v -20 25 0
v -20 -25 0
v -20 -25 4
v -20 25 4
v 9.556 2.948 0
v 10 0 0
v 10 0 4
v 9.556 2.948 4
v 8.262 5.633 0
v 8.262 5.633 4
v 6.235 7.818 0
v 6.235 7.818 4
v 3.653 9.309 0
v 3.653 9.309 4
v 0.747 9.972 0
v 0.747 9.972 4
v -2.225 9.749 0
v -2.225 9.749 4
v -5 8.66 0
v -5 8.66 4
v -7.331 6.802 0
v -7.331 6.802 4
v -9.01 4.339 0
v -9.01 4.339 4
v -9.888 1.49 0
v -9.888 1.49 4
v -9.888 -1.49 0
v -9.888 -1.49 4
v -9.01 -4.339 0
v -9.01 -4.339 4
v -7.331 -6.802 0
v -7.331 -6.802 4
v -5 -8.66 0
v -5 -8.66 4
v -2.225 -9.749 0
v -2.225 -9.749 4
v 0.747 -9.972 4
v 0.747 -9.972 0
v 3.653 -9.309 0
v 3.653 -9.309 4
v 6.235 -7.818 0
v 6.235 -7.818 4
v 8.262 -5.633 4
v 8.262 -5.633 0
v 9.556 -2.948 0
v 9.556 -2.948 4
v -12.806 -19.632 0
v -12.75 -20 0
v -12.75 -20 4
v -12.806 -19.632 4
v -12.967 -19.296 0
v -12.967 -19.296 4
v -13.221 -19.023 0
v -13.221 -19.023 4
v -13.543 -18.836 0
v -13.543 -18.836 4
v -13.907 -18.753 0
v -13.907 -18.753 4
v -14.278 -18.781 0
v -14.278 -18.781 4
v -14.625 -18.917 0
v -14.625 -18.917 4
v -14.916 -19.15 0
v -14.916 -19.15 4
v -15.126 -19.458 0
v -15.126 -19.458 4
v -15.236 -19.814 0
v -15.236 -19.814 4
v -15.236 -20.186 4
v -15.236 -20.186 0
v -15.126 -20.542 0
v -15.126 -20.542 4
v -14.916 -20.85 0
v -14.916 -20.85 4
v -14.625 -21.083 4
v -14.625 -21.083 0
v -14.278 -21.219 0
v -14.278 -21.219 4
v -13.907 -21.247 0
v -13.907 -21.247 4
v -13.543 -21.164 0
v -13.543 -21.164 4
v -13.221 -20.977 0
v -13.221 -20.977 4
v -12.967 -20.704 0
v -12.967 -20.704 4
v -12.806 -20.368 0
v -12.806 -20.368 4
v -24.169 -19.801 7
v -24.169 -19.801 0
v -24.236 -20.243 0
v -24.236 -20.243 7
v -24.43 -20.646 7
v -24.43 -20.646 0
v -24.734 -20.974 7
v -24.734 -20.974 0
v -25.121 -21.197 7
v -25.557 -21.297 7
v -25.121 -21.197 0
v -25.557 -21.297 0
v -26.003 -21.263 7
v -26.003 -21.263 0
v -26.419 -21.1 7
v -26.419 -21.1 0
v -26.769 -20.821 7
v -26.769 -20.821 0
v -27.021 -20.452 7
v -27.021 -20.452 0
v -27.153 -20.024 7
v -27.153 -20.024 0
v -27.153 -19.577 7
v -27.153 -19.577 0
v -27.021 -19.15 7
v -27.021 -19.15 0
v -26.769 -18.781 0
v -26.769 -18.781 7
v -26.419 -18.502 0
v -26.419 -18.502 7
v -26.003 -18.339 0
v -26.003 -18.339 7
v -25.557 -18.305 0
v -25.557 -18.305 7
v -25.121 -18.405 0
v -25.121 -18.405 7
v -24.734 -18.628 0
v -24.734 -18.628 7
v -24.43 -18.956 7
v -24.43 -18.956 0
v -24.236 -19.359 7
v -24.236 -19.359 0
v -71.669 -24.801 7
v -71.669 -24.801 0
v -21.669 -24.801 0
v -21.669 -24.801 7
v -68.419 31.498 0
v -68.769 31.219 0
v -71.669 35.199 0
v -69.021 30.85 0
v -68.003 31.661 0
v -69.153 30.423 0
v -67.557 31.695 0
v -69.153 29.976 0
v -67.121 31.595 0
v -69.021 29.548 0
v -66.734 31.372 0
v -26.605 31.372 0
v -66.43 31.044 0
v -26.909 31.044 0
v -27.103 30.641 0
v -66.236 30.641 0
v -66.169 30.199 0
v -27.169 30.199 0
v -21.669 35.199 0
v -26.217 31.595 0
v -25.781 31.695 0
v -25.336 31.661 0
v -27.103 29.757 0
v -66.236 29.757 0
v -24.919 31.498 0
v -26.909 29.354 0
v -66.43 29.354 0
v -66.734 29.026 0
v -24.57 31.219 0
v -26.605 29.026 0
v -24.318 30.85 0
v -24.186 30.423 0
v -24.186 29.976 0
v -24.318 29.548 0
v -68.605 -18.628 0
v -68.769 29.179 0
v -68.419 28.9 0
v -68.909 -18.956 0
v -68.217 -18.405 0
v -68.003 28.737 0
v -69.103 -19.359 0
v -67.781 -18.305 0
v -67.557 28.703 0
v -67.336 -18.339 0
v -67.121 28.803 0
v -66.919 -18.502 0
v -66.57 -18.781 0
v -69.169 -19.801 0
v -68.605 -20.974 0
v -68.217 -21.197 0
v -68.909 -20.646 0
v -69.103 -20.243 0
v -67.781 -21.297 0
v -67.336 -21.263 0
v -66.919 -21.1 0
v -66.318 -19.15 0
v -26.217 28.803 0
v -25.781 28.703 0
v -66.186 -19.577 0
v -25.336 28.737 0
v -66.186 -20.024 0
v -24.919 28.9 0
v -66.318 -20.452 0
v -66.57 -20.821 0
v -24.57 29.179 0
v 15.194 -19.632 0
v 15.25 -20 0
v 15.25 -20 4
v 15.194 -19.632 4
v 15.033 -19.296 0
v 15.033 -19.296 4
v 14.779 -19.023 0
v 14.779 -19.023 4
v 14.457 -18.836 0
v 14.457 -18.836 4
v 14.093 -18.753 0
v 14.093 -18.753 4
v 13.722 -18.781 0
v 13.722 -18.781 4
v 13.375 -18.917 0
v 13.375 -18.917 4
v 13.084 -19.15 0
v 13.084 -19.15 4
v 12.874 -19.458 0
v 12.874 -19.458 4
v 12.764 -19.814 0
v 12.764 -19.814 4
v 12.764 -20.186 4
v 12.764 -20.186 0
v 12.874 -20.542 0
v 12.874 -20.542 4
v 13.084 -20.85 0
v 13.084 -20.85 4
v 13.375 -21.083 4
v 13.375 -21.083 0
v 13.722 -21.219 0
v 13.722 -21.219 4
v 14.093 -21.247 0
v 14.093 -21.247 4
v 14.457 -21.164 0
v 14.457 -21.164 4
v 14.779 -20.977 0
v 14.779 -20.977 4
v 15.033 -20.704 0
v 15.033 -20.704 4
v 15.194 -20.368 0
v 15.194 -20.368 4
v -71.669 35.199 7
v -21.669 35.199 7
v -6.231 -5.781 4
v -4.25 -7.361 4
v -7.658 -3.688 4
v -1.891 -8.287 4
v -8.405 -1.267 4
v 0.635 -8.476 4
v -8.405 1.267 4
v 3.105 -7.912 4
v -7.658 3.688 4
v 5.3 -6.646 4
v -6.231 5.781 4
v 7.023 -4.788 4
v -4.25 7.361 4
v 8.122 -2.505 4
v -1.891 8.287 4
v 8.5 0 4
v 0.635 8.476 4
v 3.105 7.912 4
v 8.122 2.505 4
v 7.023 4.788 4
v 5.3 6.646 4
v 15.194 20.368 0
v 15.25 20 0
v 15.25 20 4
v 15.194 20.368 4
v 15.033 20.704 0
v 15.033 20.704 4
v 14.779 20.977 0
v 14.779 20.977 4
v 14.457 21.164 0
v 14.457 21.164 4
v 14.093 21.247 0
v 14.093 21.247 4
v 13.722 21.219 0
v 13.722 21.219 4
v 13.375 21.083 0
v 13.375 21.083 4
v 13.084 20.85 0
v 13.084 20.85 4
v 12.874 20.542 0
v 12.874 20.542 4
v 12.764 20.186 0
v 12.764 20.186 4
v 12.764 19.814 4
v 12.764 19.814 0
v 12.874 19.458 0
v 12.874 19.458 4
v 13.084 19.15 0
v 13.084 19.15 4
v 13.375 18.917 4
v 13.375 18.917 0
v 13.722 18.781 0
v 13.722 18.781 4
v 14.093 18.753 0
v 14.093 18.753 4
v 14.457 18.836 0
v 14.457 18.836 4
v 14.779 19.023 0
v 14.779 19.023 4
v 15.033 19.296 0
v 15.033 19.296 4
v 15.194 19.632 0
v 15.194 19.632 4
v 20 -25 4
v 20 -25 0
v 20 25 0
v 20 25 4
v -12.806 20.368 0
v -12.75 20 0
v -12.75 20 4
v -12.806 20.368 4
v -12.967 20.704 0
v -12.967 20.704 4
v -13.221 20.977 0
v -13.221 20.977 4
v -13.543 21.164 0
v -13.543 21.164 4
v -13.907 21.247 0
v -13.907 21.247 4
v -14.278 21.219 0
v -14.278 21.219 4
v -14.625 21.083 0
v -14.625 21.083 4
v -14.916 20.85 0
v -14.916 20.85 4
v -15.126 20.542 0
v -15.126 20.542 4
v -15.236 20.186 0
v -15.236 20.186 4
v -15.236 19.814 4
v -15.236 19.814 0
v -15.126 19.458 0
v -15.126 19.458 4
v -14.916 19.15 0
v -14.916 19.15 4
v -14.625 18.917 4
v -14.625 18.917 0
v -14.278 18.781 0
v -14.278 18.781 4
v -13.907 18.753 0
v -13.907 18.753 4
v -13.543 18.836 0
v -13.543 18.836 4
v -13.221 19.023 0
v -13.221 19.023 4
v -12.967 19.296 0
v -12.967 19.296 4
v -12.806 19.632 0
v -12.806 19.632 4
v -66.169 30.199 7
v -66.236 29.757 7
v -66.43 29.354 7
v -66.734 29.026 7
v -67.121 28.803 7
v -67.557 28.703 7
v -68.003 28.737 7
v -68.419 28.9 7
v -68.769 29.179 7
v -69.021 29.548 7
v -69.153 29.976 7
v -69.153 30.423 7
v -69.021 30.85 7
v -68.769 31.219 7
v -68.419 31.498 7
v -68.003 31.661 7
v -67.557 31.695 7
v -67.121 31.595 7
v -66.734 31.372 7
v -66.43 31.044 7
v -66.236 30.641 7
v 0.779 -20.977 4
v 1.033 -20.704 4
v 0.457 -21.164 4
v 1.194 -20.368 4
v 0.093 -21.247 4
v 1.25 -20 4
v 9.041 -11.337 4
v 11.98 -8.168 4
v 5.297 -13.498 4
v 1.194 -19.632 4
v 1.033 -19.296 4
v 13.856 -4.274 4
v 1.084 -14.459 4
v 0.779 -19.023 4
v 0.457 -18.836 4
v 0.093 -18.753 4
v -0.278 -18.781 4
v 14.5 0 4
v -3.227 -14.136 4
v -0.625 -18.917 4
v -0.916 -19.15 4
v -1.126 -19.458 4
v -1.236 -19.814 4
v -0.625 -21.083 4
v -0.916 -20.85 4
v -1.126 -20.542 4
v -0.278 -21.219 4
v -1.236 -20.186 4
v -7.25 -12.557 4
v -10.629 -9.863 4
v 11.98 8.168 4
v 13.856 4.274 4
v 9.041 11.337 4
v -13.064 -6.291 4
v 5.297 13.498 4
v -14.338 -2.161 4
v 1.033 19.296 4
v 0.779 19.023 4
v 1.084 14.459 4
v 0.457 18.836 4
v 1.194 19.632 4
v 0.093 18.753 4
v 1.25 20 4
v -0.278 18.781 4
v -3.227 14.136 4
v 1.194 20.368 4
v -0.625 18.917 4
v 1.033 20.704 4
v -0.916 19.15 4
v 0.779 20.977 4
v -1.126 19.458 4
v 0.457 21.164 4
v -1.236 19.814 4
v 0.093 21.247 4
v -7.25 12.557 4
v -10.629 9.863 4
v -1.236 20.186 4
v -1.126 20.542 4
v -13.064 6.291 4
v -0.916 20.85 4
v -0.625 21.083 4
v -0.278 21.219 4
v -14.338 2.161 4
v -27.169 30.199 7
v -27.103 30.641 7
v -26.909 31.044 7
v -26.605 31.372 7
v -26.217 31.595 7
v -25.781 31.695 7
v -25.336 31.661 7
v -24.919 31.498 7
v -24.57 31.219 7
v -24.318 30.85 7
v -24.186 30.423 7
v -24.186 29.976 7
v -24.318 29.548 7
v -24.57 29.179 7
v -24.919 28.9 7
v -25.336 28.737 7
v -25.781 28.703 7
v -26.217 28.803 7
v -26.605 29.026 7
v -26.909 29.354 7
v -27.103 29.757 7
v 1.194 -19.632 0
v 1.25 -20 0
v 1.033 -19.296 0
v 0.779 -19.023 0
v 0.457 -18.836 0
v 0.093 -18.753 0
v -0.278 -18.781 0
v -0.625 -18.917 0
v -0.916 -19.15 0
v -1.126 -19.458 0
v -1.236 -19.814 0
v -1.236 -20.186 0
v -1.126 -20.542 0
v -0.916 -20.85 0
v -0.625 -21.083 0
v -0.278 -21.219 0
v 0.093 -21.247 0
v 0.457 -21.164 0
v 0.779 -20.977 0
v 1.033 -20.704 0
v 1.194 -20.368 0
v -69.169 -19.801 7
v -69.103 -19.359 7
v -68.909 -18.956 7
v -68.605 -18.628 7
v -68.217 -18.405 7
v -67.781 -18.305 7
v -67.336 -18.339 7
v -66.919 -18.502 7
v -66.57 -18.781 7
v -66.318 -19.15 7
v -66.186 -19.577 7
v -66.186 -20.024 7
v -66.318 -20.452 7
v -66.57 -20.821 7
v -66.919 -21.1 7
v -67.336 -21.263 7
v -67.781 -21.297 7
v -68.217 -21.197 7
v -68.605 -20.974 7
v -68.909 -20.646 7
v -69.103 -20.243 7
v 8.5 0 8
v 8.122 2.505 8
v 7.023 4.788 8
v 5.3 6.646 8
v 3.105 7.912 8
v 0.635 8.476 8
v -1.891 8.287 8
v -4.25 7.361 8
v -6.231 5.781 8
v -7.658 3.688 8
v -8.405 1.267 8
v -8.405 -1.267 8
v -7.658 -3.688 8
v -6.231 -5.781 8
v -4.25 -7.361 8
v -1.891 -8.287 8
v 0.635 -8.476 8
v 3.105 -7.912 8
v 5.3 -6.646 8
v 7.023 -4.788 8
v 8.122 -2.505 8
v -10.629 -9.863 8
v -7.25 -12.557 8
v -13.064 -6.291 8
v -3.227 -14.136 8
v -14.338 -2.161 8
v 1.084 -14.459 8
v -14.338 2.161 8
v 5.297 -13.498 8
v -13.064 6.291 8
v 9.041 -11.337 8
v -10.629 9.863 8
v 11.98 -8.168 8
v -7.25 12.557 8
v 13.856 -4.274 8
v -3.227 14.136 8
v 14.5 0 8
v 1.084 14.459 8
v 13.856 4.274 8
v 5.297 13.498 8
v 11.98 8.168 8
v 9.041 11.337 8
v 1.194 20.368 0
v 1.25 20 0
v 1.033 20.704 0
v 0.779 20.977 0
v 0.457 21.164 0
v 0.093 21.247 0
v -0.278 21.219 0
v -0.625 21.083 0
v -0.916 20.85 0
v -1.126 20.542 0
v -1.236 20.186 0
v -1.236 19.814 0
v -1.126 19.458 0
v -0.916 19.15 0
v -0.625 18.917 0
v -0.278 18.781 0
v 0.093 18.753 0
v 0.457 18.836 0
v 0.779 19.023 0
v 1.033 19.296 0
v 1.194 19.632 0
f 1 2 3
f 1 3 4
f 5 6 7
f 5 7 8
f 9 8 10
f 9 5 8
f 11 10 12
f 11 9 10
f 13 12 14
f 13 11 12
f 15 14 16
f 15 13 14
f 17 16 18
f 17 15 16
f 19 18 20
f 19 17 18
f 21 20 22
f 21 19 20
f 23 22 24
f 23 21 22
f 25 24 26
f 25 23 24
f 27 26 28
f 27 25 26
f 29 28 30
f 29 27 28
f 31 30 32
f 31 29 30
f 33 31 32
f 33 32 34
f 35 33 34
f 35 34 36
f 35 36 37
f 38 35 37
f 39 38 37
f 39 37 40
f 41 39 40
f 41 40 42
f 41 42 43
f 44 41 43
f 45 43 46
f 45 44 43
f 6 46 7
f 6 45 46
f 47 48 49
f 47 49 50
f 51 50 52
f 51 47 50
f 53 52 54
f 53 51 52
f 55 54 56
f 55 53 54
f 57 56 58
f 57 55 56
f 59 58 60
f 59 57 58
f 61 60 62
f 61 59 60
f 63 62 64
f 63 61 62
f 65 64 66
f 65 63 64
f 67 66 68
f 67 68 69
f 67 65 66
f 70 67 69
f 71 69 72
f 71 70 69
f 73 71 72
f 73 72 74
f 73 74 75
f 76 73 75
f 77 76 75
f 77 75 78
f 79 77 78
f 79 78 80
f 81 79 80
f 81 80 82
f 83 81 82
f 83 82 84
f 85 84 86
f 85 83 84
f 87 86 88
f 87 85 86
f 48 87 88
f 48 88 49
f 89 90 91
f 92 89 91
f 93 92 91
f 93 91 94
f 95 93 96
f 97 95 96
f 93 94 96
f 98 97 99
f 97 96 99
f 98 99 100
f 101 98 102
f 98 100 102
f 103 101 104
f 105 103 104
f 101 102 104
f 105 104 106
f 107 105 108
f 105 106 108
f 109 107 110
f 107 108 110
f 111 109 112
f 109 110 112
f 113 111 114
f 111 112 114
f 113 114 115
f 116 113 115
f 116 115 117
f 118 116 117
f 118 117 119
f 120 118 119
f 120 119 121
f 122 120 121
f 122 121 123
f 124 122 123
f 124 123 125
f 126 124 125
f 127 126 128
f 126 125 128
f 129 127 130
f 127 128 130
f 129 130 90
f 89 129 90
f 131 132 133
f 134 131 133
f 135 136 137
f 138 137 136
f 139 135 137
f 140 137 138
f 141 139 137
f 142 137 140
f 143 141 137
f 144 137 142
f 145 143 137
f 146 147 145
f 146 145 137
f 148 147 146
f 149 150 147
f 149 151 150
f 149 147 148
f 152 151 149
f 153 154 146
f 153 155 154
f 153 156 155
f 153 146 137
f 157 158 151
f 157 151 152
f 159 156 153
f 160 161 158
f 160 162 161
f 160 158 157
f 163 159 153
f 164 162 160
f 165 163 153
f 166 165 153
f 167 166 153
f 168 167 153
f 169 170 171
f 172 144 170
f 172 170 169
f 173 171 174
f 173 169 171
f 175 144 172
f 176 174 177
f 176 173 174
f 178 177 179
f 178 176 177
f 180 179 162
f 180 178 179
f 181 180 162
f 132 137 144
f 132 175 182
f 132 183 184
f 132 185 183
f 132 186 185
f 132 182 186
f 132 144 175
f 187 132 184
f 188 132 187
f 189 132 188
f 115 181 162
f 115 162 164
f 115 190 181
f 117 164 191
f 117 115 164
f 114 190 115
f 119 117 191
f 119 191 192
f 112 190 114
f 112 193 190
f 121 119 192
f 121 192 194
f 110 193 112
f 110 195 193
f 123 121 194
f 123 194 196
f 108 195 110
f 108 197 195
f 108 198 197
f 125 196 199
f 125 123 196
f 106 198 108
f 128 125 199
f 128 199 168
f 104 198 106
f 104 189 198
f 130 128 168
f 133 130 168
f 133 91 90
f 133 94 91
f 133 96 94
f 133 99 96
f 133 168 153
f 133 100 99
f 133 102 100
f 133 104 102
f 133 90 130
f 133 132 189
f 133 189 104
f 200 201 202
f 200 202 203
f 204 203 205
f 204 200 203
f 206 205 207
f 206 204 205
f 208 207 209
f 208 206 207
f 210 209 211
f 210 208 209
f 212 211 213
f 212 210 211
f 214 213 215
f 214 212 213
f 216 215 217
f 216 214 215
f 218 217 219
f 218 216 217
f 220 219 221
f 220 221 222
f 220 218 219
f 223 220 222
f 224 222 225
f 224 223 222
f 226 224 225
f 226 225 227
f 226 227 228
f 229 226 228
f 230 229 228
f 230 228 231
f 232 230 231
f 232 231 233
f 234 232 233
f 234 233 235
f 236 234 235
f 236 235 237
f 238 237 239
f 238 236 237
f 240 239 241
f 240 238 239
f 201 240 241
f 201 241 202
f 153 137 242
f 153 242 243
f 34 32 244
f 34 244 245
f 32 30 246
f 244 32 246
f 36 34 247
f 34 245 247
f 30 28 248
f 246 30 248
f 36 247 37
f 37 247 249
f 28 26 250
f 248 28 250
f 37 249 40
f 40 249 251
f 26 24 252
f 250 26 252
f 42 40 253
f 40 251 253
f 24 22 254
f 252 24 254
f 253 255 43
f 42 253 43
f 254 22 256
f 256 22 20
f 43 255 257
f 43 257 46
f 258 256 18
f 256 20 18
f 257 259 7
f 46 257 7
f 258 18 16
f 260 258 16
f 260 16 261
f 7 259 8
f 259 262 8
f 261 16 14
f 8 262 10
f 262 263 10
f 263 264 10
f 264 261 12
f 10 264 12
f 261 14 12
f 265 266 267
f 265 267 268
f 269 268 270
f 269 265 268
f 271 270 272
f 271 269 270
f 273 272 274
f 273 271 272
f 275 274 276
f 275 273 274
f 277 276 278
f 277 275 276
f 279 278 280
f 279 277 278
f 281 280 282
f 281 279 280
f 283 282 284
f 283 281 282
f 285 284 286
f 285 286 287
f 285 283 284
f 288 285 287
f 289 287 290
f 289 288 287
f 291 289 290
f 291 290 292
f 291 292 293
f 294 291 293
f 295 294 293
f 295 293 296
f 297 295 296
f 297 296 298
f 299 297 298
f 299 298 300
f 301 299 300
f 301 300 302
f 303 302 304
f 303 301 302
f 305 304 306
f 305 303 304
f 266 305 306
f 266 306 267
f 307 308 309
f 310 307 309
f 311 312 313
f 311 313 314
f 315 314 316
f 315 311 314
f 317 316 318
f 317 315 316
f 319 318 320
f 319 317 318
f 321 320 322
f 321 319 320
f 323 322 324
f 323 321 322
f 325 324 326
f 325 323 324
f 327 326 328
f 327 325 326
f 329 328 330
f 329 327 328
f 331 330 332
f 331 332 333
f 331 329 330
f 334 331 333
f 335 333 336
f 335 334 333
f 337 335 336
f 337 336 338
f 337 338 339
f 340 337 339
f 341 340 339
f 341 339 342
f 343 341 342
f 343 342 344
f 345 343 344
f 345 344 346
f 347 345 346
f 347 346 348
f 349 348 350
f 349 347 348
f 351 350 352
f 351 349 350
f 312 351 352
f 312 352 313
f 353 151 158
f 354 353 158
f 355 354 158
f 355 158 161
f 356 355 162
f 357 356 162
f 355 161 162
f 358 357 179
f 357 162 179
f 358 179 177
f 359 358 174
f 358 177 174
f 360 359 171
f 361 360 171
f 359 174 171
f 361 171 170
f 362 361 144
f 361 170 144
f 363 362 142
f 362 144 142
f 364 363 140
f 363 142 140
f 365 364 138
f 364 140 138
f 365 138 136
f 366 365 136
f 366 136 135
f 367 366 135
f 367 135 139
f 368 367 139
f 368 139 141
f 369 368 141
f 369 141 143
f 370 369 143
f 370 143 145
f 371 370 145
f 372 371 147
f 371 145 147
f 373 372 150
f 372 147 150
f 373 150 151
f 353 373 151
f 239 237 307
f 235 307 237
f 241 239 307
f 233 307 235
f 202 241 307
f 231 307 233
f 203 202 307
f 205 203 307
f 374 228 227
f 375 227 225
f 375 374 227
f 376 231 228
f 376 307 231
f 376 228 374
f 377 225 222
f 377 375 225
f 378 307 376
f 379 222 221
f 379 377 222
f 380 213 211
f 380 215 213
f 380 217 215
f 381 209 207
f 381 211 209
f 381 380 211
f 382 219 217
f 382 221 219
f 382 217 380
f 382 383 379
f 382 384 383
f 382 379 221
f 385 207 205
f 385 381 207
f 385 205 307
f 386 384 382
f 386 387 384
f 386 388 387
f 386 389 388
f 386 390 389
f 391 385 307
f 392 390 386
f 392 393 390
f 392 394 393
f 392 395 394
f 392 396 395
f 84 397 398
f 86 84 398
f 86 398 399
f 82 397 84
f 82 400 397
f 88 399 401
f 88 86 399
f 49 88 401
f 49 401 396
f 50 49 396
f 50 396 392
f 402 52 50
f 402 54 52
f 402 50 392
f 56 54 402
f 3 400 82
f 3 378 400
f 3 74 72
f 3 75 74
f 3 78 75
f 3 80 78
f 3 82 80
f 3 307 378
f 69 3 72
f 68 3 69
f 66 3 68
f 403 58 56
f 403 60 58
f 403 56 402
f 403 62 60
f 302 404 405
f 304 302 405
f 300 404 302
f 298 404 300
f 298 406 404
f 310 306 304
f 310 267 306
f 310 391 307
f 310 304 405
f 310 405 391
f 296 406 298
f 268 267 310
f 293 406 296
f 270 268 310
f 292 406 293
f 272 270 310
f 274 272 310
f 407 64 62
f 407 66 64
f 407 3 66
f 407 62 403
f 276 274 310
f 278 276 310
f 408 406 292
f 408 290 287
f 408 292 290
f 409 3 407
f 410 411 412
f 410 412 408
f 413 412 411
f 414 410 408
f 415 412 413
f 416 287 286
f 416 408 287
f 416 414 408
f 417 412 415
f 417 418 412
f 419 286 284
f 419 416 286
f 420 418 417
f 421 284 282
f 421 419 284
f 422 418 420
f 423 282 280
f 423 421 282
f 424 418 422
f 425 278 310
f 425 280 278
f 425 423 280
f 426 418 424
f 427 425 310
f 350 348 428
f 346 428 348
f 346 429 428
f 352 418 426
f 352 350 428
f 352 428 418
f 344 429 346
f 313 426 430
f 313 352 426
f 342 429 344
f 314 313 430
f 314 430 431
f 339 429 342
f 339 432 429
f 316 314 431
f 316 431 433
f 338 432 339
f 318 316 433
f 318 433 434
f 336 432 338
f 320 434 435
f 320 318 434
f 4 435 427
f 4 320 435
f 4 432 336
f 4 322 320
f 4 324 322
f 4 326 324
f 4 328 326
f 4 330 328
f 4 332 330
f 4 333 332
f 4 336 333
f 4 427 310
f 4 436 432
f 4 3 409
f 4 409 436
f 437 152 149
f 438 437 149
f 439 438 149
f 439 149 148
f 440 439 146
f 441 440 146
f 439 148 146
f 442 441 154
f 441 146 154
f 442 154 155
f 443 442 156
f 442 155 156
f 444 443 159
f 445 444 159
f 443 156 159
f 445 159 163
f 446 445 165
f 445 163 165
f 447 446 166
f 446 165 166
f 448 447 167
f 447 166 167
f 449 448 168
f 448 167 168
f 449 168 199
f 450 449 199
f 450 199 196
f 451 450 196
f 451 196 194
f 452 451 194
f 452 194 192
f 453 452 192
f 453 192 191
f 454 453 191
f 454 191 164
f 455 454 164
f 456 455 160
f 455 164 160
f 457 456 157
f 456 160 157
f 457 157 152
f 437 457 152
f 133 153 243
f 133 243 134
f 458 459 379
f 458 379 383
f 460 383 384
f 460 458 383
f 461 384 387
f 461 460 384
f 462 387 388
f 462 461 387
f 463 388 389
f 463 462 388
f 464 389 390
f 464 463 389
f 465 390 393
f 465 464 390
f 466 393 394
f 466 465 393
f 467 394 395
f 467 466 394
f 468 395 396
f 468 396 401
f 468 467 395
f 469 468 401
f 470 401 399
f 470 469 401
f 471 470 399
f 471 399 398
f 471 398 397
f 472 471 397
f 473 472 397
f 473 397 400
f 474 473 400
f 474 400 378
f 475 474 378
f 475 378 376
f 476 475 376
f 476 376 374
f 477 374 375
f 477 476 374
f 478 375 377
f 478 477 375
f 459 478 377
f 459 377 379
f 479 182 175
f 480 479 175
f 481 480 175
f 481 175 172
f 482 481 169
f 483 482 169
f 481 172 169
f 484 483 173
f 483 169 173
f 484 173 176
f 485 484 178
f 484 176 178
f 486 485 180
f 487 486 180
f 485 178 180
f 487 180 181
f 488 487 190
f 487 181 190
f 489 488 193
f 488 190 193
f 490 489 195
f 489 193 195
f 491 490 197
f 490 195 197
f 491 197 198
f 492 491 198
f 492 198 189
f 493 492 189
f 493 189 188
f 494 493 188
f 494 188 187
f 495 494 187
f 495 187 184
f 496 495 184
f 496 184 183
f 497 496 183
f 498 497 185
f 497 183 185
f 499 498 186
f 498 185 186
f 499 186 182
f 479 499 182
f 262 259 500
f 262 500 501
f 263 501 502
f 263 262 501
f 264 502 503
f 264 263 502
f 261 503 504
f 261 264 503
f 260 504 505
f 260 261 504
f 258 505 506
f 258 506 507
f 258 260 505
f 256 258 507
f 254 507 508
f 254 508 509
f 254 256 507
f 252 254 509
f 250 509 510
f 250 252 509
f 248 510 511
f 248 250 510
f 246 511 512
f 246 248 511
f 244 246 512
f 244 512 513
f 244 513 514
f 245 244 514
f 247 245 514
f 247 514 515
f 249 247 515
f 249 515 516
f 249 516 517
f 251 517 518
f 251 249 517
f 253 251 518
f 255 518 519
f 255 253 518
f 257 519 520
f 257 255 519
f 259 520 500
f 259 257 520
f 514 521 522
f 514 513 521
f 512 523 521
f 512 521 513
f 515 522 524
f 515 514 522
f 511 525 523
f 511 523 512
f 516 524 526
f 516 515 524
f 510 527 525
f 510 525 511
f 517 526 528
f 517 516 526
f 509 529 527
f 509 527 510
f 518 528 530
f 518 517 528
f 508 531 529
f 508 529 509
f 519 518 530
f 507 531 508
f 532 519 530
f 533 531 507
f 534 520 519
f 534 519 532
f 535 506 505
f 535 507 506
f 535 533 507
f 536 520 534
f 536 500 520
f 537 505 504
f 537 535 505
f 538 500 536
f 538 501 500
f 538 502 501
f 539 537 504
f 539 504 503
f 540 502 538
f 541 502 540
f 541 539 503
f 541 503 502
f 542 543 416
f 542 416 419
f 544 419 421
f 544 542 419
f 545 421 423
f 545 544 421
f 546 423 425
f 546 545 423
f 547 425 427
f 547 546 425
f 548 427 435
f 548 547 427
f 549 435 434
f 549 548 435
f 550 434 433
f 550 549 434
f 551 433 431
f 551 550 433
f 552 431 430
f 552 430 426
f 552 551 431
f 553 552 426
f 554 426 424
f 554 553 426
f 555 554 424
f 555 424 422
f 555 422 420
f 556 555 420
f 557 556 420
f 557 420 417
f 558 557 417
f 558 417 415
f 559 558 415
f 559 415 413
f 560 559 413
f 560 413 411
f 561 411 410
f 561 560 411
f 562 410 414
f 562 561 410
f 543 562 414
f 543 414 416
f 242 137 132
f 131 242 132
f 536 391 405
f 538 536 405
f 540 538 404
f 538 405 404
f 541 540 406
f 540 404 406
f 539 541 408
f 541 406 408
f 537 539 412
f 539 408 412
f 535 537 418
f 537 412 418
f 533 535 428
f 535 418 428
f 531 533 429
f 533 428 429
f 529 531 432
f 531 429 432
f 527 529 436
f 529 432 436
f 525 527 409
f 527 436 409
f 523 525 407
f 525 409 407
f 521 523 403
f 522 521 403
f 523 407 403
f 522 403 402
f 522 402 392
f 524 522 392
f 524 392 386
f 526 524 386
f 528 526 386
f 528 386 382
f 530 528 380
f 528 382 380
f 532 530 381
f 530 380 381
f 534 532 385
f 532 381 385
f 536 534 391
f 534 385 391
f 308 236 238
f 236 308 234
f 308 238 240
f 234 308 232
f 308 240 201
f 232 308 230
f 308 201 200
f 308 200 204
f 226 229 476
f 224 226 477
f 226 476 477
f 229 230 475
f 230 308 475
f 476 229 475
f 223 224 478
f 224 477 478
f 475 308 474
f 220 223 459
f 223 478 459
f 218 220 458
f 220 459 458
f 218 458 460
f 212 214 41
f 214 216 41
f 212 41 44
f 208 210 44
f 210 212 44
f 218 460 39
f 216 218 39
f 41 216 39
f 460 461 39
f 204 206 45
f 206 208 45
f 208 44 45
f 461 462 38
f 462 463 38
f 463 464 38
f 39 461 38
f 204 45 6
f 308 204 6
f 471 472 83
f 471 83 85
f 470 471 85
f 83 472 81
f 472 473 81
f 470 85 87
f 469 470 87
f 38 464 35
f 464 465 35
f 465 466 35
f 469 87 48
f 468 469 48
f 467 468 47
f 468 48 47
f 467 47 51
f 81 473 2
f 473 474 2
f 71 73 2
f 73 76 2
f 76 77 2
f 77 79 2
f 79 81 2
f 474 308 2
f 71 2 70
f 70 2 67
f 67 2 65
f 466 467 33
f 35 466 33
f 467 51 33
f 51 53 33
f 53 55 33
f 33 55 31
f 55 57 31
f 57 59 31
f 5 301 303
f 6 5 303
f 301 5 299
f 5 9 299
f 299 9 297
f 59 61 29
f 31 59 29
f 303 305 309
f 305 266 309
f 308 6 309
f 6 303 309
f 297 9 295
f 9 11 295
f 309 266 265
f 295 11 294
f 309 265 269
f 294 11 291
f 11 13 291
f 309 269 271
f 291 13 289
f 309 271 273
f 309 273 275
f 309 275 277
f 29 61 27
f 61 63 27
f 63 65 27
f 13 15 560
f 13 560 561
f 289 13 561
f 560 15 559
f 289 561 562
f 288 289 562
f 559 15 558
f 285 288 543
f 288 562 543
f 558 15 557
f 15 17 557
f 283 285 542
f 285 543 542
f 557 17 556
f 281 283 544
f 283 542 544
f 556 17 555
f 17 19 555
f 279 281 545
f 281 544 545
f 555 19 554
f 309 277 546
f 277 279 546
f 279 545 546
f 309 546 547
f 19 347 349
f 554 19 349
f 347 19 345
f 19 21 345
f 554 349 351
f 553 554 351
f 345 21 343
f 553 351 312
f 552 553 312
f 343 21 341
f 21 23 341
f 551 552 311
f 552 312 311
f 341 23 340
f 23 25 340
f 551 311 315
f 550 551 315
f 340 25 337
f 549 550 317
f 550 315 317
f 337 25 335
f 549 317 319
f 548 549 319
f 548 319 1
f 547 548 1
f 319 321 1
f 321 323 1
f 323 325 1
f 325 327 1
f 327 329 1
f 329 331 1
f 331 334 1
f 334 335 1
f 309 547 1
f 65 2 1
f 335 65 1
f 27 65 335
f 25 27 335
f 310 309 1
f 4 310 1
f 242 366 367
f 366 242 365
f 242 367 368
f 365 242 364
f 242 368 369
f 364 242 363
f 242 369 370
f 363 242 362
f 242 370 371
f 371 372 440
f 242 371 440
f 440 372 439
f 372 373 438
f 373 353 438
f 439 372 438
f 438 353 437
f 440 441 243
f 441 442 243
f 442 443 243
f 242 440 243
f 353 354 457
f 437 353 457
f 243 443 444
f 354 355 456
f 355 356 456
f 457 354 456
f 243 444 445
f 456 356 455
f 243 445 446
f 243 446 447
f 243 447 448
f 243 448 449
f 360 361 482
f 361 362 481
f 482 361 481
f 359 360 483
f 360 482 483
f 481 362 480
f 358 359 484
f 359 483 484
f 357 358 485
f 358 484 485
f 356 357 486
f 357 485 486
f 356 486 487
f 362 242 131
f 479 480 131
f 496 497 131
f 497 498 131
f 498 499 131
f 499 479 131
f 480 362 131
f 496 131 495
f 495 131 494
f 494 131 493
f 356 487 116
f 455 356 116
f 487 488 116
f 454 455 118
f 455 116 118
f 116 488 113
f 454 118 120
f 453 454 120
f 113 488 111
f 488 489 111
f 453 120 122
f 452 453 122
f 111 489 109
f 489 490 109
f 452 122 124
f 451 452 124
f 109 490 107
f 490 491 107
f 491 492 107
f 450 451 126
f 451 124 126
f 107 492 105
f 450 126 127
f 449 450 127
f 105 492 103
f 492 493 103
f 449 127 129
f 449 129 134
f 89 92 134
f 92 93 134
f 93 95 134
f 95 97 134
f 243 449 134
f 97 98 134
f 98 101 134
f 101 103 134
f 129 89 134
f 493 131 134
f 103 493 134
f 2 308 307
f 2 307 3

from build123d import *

# Parameters (mm, degrees)
SKETCH1_W           = 50
SKETCH1_H           = 40
SKETCH1_R           = 10
SKETCH1_R_2         = 1.25
BOSS_EXTRUDE1_DEPTH = 4
SKETCH2_R           = 14.5
SKETCH2_R_2         = 8.5
BOSS_EXTRUDE2_DEPTH = 4
SKETCH3_W           = 50
SKETCH3_H           = 60
SKETCH3_R           = 1.5
BOSS_EXTRUDE3_DEPTH = 7


with BuildPart() as part:
    # Sketch1 → Boss-Extrude1 (new body)
    with BuildSketch(Plane(origin=(0, 0, 0), x_dir=(0, 1, 0), z_dir=(0, 0, 1))):
        Rectangle(SKETCH1_W, SKETCH1_H)
        with Locations(Location((0, 0, 0), (0, 0, 270))):
            Circle(SKETCH1_R, mode=Mode.SUBTRACT)
        with Locations(Location((-20, 14, 0), (0, 0, 270))):
            Circle(SKETCH1_R_2, mode=Mode.SUBTRACT)
        with Locations(Location((-20, -14, 0), (0, 0, 270))):
            Circle(SKETCH1_R_2, mode=Mode.SUBTRACT)
        with Locations(Location((20, 14, 0), (0, 0, 270))):
            Circle(SKETCH1_R_2, mode=Mode.SUBTRACT)
        with Locations(Location((20, -14, 0), (0, 0, 270))):
            Circle(SKETCH1_R_2, mode=Mode.SUBTRACT)
        with Locations(Location((-20, 0, 0), (0, 0, 270))):
            Circle(SKETCH1_R_2, mode=Mode.SUBTRACT)
        with Locations(Location((20, 0, 0), (0, 0, 270))):
            Circle(SKETCH1_R_2, mode=Mode.SUBTRACT)
    extrude(amount=BOSS_EXTRUDE1_DEPTH)

    # Sketch2 → Boss-Extrude2 (add)
    with BuildSketch(Plane.XY.offset(4)):
        Circle(SKETCH2_R)
        Circle(SKETCH2_R_2, mode=Mode.SUBTRACT)
    extrude(amount=BOSS_EXTRUDE2_DEPTH)


with BuildPart() as body_2:
    # Sketch3 → Boss-Extrude3 (new body)
    with BuildSketch(Plane(origin=(0, 0, 0), x_dir=(1, 0, 0), z_dir=(0, 0, -1))):
        with Locations((-46.669401007, -5.199106425)):
            Rectangle(SKETCH3_W, SKETCH3_H)
        with Locations(Location((-67.669401007, 19.800893575, 0), (0, 0, 180))):
            Circle(SKETCH3_R, mode=Mode.SUBTRACT)
        with Locations((-25.669401007, 19.800893575)):
            Circle(SKETCH3_R, mode=Mode.SUBTRACT)
        with Locations(Location((-25.669401007, -30.199106425, 0), (0, 0, 180))):
            Circle(SKETCH3_R, mode=Mode.SUBTRACT)
        with Locations((-67.669401007, -30.199106425)):
            Circle(SKETCH3_R, mode=Mode.SUBTRACT)
    extrude(amount=-BOSS_EXTRUDE3_DEPTH)


solid = Compound([part.part, body_2.part])
